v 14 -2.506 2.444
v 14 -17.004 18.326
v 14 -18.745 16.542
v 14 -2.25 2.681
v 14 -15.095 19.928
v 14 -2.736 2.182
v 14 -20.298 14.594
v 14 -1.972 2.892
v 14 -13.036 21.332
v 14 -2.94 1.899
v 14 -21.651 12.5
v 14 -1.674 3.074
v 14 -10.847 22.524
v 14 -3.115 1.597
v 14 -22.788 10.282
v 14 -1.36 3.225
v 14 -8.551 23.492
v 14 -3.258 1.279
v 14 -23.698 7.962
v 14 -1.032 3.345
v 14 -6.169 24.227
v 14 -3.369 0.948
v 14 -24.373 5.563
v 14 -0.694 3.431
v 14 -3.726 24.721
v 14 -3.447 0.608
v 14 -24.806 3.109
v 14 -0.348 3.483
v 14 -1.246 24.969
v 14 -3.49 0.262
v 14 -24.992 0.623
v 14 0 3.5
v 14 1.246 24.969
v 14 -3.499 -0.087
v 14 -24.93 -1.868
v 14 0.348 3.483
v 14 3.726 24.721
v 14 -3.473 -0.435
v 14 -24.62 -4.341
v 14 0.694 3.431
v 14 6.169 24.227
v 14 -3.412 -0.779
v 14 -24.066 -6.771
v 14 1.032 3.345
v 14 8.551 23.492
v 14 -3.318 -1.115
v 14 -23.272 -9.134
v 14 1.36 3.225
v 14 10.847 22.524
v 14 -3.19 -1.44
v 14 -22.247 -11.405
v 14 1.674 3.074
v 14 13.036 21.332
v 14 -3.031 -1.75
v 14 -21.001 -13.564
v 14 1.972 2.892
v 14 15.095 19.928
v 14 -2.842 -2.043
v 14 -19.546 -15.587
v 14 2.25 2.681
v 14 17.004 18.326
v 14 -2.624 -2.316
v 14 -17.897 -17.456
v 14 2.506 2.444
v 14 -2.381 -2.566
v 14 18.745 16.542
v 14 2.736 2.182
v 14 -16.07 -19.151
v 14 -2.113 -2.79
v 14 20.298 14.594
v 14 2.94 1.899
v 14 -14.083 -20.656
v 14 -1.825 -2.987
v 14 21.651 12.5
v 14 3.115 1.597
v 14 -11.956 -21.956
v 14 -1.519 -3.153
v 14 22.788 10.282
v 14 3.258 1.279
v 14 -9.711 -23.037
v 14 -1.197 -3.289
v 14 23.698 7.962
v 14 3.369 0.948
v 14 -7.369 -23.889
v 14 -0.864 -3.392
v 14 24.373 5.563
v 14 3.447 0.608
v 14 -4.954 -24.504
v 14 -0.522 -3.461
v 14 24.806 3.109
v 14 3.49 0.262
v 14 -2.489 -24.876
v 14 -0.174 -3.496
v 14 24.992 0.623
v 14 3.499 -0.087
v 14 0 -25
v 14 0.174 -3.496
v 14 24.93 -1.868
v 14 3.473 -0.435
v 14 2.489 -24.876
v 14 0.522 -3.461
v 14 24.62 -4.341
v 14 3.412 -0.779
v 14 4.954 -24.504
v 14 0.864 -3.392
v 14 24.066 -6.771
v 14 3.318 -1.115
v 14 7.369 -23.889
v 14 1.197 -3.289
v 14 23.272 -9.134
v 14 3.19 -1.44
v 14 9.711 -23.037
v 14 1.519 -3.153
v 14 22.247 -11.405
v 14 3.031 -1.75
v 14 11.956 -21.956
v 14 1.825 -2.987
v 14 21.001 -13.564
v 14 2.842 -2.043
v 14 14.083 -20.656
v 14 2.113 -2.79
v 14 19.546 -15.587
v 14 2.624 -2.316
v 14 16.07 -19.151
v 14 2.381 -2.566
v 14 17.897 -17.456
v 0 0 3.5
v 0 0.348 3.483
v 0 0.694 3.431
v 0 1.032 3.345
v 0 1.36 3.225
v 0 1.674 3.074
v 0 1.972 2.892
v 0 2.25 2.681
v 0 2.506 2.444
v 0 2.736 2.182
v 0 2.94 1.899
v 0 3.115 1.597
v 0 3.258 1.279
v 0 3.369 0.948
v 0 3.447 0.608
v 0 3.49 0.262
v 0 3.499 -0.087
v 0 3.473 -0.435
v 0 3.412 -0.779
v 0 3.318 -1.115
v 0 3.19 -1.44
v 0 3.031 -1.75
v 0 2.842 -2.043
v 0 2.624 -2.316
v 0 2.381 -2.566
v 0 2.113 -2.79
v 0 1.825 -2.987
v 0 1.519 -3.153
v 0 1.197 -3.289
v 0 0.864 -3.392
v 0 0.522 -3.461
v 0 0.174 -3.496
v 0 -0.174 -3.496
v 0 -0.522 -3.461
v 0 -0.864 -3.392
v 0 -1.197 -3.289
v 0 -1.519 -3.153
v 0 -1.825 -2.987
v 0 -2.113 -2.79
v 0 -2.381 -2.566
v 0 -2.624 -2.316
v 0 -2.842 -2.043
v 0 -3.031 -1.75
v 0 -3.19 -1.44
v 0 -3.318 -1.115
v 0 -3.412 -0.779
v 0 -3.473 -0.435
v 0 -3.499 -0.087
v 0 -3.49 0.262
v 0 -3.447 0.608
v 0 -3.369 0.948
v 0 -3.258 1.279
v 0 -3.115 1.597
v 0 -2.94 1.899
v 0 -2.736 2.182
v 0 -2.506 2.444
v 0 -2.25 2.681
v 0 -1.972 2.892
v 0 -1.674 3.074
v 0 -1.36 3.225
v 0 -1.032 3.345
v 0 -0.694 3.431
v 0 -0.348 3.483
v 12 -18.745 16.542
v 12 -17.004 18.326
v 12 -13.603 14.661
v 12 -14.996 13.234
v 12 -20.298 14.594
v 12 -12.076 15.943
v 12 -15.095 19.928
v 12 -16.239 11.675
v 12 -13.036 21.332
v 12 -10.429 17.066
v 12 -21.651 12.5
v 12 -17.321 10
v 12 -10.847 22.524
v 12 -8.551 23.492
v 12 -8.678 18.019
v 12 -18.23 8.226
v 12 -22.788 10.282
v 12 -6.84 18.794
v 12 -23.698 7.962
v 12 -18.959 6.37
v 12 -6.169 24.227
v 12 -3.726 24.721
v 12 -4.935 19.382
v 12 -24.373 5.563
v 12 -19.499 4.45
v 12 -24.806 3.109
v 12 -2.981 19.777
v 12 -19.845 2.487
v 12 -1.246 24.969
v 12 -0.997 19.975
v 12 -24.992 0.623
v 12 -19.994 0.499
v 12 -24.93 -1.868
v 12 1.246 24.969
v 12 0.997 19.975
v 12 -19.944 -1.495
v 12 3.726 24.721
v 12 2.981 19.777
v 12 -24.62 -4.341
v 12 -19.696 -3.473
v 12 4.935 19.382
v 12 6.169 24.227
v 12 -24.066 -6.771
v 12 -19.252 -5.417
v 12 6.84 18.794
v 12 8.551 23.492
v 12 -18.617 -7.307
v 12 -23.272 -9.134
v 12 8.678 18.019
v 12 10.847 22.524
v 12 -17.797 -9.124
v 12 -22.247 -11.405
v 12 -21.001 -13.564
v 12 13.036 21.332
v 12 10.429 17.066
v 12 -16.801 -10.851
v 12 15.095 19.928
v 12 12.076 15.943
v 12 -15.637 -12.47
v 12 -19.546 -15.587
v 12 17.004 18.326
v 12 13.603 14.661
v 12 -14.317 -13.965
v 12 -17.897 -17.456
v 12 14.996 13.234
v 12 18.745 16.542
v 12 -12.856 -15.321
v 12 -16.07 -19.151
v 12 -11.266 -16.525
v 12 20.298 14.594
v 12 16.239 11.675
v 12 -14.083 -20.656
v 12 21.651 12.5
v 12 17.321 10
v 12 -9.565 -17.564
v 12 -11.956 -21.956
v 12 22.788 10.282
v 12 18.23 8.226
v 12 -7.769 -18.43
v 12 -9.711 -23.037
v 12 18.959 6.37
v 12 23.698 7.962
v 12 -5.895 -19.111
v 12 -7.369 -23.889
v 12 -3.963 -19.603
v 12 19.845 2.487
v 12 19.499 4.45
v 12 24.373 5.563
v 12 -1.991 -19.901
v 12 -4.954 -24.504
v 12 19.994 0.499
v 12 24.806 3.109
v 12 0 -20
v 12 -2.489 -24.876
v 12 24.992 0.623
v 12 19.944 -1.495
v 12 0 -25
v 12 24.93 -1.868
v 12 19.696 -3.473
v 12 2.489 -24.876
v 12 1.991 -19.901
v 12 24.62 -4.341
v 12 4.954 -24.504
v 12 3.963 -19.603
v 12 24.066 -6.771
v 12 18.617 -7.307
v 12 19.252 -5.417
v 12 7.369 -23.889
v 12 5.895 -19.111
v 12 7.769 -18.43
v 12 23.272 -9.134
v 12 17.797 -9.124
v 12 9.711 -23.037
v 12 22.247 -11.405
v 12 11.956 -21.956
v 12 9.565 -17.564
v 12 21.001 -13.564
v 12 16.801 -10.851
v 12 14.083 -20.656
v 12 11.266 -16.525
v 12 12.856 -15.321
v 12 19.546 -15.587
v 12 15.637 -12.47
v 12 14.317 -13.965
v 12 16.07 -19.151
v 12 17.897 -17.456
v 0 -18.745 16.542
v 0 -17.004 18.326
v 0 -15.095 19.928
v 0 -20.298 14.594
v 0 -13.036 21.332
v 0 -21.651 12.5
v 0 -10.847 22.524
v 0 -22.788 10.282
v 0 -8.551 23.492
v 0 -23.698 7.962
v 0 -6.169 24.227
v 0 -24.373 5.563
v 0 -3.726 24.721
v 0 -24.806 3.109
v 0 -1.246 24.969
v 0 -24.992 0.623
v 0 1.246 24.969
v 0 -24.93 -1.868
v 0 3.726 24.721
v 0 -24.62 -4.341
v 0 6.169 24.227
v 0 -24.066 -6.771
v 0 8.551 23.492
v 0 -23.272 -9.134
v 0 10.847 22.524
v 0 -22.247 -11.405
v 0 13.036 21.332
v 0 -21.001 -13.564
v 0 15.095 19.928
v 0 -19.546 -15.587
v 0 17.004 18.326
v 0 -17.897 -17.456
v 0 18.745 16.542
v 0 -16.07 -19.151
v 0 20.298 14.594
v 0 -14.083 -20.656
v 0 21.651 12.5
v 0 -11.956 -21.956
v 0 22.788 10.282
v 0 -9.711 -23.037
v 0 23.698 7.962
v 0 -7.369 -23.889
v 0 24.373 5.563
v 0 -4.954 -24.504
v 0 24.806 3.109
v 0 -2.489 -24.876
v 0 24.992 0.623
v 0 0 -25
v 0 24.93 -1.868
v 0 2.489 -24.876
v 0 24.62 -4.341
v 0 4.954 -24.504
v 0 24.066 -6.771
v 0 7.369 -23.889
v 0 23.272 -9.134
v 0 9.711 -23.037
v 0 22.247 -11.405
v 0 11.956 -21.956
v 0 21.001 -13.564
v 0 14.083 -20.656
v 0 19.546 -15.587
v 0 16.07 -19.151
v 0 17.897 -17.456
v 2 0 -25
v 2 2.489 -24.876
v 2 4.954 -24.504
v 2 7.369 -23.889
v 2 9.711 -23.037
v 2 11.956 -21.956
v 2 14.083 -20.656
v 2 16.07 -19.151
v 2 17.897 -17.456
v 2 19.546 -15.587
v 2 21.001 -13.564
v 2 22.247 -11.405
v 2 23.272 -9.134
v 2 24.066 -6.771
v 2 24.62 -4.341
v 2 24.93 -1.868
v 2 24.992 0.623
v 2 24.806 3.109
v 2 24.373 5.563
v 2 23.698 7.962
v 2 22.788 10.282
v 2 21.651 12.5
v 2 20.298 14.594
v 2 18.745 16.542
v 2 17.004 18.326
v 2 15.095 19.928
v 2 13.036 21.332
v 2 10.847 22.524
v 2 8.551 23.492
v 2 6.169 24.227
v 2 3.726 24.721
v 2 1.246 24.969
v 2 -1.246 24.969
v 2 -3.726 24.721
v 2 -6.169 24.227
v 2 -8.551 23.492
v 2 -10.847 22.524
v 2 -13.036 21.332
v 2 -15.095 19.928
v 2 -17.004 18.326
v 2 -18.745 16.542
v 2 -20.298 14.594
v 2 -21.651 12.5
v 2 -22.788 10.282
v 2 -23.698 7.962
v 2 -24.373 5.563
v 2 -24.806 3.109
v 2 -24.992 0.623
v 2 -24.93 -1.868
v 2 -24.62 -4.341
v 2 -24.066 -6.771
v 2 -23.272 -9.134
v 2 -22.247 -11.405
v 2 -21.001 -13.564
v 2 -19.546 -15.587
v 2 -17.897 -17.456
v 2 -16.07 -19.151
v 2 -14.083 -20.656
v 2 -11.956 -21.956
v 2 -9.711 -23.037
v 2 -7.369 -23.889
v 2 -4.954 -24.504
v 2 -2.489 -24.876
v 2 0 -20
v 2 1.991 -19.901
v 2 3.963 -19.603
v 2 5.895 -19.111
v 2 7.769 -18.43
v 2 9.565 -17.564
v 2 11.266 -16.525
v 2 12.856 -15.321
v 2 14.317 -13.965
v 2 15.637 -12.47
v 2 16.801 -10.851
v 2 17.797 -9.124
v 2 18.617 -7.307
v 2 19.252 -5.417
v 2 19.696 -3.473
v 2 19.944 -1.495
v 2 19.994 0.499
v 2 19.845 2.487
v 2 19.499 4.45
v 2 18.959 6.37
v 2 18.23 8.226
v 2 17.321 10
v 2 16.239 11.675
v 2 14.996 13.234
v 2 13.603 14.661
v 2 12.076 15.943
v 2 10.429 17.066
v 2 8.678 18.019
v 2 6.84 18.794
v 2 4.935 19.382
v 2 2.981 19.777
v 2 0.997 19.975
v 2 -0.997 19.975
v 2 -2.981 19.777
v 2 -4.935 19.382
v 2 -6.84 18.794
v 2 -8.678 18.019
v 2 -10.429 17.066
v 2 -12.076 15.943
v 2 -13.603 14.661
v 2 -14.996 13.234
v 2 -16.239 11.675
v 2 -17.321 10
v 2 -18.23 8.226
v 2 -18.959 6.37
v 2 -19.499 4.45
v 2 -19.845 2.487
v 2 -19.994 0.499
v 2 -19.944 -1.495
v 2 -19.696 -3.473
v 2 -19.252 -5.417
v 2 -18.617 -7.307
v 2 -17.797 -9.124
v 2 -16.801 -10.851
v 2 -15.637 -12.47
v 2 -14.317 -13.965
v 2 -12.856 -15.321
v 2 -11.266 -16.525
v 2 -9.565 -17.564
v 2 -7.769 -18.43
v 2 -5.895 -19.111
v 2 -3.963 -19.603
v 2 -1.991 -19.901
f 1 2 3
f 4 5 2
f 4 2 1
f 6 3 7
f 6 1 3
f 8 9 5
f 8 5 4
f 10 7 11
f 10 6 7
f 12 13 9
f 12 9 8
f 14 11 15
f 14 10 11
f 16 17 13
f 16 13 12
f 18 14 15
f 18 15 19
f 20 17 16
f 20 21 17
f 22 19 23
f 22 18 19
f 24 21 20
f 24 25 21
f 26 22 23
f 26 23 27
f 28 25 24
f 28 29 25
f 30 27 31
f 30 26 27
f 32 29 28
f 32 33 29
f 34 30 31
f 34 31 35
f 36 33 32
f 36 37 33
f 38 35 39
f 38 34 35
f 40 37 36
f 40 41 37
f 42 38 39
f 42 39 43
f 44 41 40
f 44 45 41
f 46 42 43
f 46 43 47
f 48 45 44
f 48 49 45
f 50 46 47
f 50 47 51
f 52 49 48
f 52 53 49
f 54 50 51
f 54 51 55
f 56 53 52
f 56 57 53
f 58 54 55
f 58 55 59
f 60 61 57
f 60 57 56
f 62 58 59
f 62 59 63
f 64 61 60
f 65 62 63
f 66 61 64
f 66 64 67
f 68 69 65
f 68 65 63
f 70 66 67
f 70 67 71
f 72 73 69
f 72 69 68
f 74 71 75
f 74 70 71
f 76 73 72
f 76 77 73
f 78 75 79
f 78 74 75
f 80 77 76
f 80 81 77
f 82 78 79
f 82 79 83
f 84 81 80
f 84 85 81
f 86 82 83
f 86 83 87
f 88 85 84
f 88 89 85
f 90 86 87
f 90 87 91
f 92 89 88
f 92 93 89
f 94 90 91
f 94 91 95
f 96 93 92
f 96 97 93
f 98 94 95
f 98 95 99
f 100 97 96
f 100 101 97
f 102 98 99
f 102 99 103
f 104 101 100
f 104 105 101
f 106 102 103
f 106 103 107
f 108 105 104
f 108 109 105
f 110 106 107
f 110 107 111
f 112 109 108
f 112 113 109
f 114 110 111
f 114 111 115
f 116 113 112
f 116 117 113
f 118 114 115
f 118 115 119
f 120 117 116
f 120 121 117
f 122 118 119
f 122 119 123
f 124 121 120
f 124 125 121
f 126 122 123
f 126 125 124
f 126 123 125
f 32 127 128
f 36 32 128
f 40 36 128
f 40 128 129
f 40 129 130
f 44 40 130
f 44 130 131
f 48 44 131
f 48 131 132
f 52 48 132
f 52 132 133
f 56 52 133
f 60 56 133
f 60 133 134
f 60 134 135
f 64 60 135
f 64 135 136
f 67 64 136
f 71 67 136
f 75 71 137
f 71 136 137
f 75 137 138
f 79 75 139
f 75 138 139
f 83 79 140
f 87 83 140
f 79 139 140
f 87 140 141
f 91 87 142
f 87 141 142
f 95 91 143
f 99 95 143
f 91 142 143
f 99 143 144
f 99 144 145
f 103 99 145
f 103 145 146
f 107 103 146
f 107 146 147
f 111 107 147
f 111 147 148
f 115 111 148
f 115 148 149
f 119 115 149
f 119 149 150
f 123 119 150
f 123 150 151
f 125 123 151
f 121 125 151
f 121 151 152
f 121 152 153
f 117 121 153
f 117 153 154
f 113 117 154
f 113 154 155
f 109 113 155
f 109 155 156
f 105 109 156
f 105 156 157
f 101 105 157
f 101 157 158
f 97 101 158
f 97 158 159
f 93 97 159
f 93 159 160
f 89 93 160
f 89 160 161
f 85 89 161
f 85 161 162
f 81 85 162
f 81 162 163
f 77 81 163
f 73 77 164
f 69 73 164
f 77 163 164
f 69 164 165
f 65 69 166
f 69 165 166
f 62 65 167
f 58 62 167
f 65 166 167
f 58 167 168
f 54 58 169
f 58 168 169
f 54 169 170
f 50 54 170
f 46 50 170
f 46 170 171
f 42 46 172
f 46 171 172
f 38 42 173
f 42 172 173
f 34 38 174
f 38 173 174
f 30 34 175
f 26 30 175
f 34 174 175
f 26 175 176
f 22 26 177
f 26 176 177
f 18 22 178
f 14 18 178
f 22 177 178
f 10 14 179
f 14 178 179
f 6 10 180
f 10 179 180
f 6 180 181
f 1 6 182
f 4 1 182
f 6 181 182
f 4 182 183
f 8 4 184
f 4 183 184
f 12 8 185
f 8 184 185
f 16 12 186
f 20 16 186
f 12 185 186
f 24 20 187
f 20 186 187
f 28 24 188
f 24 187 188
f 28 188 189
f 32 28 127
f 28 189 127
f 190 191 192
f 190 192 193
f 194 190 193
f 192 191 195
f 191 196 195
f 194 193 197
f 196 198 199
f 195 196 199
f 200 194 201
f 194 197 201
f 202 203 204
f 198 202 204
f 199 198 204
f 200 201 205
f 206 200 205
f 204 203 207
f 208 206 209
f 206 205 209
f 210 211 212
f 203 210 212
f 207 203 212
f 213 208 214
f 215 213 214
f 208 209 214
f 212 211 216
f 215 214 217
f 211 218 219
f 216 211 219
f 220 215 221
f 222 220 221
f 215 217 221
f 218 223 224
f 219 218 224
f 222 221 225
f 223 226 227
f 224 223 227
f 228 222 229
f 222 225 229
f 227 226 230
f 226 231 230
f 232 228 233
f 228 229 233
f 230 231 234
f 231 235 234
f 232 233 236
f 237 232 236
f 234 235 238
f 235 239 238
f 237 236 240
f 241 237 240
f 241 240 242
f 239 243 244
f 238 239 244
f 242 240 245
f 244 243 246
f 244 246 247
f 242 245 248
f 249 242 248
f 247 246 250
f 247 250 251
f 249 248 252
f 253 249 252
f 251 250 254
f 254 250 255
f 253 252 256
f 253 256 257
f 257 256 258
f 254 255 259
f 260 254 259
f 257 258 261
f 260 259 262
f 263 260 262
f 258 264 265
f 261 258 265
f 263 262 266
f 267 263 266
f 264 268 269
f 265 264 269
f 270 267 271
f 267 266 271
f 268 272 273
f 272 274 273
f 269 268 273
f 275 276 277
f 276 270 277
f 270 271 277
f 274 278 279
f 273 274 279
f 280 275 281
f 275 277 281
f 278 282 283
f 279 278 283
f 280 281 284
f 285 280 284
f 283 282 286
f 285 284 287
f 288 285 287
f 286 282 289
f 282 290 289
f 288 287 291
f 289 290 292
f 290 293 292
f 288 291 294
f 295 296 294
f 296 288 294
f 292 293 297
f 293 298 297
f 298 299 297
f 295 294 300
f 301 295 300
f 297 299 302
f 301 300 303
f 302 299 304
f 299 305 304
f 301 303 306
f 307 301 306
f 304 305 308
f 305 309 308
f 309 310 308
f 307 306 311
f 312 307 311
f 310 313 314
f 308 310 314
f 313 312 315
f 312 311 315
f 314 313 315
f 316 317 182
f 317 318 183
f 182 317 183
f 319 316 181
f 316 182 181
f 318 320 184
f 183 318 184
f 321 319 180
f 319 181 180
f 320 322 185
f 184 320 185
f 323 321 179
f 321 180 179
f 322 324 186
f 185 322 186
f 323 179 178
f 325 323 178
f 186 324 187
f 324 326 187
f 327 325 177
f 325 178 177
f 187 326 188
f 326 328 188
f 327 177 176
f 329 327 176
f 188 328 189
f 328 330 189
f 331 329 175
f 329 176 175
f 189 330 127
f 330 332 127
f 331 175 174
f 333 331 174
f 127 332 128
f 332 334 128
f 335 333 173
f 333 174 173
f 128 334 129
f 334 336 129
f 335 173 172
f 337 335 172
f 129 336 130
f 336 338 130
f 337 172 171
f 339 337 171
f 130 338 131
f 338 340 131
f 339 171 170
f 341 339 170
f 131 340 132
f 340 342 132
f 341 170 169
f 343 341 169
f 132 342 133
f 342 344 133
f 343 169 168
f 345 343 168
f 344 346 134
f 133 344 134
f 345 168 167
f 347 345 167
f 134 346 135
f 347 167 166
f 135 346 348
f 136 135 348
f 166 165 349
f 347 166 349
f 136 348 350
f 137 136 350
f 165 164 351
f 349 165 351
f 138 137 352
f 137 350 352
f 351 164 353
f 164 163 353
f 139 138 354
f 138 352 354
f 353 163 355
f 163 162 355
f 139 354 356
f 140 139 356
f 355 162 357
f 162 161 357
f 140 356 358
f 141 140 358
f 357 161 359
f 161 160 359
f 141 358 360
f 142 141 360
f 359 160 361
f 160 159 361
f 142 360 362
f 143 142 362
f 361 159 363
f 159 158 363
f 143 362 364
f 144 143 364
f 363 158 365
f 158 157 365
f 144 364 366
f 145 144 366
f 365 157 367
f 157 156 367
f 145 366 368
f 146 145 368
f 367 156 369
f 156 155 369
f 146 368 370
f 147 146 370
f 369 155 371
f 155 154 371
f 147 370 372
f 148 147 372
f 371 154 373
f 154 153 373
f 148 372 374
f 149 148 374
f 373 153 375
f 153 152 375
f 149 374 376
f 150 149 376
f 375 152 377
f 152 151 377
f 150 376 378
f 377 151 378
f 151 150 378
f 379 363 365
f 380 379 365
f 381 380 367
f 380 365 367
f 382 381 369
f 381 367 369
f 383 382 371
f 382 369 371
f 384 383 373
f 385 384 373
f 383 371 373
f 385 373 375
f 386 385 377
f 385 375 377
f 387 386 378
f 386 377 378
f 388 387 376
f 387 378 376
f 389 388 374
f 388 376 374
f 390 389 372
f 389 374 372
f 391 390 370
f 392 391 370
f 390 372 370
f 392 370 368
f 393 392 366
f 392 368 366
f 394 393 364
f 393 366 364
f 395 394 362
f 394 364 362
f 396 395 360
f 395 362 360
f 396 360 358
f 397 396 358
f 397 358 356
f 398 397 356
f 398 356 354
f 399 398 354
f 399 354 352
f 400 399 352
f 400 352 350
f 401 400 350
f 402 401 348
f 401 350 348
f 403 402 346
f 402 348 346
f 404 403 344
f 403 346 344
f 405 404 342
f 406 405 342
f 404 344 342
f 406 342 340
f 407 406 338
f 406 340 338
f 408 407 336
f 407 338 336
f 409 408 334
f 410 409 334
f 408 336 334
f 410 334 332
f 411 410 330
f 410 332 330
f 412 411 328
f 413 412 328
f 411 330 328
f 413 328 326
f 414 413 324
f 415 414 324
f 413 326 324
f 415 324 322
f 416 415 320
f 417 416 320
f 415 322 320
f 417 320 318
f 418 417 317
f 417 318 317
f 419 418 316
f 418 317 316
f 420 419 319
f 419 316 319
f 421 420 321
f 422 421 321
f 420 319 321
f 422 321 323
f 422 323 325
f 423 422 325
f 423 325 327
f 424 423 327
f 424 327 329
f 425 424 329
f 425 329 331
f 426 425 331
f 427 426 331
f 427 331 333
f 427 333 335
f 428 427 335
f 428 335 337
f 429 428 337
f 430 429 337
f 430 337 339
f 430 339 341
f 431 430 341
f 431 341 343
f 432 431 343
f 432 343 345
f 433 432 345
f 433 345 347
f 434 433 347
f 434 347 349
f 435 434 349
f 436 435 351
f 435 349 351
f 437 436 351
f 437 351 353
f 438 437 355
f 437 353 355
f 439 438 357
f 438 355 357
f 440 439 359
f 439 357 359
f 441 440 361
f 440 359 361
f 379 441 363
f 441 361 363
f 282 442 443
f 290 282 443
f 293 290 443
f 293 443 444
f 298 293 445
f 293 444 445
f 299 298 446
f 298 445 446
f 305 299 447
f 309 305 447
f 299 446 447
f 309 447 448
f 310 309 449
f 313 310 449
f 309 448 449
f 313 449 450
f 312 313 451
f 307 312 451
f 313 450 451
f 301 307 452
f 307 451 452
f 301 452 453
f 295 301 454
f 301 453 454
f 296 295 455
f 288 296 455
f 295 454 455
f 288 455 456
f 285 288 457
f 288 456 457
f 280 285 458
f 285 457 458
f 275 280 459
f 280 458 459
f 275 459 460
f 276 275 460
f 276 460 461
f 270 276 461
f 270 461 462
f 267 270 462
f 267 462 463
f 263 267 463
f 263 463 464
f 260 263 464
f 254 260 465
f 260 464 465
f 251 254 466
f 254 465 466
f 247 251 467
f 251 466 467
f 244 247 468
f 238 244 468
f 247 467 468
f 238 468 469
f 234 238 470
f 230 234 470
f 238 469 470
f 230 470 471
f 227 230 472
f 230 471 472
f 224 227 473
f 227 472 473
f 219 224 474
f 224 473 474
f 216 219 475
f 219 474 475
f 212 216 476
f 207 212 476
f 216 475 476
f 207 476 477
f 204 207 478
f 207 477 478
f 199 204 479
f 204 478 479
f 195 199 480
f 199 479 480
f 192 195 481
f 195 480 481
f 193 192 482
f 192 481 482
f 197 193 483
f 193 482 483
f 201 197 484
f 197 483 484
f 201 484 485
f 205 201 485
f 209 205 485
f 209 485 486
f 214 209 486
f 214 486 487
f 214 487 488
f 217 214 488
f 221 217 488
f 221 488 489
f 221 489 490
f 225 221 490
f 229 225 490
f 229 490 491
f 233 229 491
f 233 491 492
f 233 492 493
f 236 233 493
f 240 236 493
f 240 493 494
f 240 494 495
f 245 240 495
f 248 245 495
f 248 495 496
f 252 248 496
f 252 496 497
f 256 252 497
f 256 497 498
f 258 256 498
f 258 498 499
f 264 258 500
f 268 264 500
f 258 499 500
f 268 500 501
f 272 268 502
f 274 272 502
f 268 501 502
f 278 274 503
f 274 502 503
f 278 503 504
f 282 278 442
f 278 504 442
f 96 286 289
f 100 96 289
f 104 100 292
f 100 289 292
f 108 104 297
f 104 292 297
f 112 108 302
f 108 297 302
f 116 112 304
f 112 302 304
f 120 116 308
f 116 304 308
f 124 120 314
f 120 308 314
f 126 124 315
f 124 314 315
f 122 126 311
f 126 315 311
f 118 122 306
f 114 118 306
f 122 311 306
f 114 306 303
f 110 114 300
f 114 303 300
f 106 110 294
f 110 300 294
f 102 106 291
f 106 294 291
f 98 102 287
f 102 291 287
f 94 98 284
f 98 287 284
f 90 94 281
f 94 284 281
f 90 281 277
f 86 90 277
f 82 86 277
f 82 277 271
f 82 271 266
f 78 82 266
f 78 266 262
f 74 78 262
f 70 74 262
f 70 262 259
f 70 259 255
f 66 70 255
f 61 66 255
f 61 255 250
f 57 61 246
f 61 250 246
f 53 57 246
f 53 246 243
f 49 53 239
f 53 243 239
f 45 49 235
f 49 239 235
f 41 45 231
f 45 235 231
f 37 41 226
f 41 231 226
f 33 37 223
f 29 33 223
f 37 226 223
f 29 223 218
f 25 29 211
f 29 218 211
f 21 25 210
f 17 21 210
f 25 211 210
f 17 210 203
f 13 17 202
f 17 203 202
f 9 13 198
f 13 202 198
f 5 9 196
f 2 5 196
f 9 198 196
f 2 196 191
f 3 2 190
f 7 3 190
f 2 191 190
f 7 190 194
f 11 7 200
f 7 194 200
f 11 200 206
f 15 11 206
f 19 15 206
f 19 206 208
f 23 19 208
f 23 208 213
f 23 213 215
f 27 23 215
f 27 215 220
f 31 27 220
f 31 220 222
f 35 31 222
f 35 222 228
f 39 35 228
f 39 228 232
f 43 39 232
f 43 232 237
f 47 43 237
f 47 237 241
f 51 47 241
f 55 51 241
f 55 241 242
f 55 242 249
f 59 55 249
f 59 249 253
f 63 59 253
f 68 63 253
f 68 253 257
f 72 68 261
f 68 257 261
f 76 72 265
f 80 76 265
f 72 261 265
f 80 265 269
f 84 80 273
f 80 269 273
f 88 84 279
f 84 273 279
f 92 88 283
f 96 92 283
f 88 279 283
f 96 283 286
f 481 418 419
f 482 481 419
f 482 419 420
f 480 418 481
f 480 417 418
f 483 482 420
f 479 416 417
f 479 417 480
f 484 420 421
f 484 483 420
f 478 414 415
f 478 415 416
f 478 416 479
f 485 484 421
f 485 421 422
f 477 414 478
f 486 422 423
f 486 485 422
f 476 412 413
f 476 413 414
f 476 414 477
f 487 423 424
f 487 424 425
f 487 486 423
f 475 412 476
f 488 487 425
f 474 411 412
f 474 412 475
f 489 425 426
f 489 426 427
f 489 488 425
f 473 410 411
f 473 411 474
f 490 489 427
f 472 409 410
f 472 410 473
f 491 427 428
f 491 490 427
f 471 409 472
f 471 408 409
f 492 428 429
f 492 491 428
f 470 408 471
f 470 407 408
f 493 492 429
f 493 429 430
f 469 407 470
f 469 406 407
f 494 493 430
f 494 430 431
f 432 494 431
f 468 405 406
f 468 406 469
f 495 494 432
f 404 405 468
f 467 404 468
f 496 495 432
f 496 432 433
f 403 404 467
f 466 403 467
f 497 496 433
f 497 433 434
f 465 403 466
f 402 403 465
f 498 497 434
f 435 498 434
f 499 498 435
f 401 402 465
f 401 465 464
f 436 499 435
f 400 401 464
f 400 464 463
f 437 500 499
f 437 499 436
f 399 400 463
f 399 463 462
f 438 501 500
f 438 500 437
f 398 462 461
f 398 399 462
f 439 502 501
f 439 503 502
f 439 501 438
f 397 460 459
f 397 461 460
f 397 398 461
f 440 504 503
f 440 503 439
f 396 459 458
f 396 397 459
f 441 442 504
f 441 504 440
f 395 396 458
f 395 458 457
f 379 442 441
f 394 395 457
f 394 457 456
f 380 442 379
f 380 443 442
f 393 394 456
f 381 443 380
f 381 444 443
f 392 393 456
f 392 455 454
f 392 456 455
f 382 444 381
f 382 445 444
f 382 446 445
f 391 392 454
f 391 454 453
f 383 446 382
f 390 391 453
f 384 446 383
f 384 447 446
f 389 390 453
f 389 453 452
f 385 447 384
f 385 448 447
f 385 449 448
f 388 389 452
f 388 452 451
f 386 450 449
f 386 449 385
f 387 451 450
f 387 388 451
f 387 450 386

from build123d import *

# Parameters (mm, degrees)
SKETCH1_R           = 25
BOSS_EXTRUDE1_DEPTH = 2
SKETCH2_R           = 20
BOSS_EXTRUDE2_DEPTH = 10
SKETCH3_R           = 25
BOSS_EXTRUDE3_DEPTH = 2
SKETCH4_R           = 3.5
CUT_EXTRUDE1_DEPTH  = 19


with BuildPart() as part:
    # Sketch1 → Boss-Extrude1 (new body)
    with BuildSketch(Plane(origin=(0, 0, 0), x_dir=(0, 0, -1), z_dir=(1, 0, 0))):
        Circle(SKETCH1_R)
    extrude(amount=BOSS_EXTRUDE1_DEPTH)

    # Sketch2 → Boss-Extrude2 (add)
    with BuildSketch(Plane(origin=(2, 0, 0), x_dir=(0, 0, -1), z_dir=(1, 0, 0))):
        Circle(SKETCH2_R)
    extrude(amount=BOSS_EXTRUDE2_DEPTH)

    # Sketch3 → Boss-Extrude3 (add)
    with BuildSketch(Plane(origin=(12, 0, 0), x_dir=(0, 0, -1), z_dir=(1, 0, 0))):
        Circle(SKETCH3_R)
    extrude(amount=BOSS_EXTRUDE3_DEPTH)

    # Sketch4 → Cut-Extrude1 (cut)
    with BuildSketch(Plane.ZY):
        Circle(SKETCH4_R)
    extrude(amount=-CUT_EXTRUDE1_DEPTH, mode=Mode.SUBTRACT)


solid = part.part
